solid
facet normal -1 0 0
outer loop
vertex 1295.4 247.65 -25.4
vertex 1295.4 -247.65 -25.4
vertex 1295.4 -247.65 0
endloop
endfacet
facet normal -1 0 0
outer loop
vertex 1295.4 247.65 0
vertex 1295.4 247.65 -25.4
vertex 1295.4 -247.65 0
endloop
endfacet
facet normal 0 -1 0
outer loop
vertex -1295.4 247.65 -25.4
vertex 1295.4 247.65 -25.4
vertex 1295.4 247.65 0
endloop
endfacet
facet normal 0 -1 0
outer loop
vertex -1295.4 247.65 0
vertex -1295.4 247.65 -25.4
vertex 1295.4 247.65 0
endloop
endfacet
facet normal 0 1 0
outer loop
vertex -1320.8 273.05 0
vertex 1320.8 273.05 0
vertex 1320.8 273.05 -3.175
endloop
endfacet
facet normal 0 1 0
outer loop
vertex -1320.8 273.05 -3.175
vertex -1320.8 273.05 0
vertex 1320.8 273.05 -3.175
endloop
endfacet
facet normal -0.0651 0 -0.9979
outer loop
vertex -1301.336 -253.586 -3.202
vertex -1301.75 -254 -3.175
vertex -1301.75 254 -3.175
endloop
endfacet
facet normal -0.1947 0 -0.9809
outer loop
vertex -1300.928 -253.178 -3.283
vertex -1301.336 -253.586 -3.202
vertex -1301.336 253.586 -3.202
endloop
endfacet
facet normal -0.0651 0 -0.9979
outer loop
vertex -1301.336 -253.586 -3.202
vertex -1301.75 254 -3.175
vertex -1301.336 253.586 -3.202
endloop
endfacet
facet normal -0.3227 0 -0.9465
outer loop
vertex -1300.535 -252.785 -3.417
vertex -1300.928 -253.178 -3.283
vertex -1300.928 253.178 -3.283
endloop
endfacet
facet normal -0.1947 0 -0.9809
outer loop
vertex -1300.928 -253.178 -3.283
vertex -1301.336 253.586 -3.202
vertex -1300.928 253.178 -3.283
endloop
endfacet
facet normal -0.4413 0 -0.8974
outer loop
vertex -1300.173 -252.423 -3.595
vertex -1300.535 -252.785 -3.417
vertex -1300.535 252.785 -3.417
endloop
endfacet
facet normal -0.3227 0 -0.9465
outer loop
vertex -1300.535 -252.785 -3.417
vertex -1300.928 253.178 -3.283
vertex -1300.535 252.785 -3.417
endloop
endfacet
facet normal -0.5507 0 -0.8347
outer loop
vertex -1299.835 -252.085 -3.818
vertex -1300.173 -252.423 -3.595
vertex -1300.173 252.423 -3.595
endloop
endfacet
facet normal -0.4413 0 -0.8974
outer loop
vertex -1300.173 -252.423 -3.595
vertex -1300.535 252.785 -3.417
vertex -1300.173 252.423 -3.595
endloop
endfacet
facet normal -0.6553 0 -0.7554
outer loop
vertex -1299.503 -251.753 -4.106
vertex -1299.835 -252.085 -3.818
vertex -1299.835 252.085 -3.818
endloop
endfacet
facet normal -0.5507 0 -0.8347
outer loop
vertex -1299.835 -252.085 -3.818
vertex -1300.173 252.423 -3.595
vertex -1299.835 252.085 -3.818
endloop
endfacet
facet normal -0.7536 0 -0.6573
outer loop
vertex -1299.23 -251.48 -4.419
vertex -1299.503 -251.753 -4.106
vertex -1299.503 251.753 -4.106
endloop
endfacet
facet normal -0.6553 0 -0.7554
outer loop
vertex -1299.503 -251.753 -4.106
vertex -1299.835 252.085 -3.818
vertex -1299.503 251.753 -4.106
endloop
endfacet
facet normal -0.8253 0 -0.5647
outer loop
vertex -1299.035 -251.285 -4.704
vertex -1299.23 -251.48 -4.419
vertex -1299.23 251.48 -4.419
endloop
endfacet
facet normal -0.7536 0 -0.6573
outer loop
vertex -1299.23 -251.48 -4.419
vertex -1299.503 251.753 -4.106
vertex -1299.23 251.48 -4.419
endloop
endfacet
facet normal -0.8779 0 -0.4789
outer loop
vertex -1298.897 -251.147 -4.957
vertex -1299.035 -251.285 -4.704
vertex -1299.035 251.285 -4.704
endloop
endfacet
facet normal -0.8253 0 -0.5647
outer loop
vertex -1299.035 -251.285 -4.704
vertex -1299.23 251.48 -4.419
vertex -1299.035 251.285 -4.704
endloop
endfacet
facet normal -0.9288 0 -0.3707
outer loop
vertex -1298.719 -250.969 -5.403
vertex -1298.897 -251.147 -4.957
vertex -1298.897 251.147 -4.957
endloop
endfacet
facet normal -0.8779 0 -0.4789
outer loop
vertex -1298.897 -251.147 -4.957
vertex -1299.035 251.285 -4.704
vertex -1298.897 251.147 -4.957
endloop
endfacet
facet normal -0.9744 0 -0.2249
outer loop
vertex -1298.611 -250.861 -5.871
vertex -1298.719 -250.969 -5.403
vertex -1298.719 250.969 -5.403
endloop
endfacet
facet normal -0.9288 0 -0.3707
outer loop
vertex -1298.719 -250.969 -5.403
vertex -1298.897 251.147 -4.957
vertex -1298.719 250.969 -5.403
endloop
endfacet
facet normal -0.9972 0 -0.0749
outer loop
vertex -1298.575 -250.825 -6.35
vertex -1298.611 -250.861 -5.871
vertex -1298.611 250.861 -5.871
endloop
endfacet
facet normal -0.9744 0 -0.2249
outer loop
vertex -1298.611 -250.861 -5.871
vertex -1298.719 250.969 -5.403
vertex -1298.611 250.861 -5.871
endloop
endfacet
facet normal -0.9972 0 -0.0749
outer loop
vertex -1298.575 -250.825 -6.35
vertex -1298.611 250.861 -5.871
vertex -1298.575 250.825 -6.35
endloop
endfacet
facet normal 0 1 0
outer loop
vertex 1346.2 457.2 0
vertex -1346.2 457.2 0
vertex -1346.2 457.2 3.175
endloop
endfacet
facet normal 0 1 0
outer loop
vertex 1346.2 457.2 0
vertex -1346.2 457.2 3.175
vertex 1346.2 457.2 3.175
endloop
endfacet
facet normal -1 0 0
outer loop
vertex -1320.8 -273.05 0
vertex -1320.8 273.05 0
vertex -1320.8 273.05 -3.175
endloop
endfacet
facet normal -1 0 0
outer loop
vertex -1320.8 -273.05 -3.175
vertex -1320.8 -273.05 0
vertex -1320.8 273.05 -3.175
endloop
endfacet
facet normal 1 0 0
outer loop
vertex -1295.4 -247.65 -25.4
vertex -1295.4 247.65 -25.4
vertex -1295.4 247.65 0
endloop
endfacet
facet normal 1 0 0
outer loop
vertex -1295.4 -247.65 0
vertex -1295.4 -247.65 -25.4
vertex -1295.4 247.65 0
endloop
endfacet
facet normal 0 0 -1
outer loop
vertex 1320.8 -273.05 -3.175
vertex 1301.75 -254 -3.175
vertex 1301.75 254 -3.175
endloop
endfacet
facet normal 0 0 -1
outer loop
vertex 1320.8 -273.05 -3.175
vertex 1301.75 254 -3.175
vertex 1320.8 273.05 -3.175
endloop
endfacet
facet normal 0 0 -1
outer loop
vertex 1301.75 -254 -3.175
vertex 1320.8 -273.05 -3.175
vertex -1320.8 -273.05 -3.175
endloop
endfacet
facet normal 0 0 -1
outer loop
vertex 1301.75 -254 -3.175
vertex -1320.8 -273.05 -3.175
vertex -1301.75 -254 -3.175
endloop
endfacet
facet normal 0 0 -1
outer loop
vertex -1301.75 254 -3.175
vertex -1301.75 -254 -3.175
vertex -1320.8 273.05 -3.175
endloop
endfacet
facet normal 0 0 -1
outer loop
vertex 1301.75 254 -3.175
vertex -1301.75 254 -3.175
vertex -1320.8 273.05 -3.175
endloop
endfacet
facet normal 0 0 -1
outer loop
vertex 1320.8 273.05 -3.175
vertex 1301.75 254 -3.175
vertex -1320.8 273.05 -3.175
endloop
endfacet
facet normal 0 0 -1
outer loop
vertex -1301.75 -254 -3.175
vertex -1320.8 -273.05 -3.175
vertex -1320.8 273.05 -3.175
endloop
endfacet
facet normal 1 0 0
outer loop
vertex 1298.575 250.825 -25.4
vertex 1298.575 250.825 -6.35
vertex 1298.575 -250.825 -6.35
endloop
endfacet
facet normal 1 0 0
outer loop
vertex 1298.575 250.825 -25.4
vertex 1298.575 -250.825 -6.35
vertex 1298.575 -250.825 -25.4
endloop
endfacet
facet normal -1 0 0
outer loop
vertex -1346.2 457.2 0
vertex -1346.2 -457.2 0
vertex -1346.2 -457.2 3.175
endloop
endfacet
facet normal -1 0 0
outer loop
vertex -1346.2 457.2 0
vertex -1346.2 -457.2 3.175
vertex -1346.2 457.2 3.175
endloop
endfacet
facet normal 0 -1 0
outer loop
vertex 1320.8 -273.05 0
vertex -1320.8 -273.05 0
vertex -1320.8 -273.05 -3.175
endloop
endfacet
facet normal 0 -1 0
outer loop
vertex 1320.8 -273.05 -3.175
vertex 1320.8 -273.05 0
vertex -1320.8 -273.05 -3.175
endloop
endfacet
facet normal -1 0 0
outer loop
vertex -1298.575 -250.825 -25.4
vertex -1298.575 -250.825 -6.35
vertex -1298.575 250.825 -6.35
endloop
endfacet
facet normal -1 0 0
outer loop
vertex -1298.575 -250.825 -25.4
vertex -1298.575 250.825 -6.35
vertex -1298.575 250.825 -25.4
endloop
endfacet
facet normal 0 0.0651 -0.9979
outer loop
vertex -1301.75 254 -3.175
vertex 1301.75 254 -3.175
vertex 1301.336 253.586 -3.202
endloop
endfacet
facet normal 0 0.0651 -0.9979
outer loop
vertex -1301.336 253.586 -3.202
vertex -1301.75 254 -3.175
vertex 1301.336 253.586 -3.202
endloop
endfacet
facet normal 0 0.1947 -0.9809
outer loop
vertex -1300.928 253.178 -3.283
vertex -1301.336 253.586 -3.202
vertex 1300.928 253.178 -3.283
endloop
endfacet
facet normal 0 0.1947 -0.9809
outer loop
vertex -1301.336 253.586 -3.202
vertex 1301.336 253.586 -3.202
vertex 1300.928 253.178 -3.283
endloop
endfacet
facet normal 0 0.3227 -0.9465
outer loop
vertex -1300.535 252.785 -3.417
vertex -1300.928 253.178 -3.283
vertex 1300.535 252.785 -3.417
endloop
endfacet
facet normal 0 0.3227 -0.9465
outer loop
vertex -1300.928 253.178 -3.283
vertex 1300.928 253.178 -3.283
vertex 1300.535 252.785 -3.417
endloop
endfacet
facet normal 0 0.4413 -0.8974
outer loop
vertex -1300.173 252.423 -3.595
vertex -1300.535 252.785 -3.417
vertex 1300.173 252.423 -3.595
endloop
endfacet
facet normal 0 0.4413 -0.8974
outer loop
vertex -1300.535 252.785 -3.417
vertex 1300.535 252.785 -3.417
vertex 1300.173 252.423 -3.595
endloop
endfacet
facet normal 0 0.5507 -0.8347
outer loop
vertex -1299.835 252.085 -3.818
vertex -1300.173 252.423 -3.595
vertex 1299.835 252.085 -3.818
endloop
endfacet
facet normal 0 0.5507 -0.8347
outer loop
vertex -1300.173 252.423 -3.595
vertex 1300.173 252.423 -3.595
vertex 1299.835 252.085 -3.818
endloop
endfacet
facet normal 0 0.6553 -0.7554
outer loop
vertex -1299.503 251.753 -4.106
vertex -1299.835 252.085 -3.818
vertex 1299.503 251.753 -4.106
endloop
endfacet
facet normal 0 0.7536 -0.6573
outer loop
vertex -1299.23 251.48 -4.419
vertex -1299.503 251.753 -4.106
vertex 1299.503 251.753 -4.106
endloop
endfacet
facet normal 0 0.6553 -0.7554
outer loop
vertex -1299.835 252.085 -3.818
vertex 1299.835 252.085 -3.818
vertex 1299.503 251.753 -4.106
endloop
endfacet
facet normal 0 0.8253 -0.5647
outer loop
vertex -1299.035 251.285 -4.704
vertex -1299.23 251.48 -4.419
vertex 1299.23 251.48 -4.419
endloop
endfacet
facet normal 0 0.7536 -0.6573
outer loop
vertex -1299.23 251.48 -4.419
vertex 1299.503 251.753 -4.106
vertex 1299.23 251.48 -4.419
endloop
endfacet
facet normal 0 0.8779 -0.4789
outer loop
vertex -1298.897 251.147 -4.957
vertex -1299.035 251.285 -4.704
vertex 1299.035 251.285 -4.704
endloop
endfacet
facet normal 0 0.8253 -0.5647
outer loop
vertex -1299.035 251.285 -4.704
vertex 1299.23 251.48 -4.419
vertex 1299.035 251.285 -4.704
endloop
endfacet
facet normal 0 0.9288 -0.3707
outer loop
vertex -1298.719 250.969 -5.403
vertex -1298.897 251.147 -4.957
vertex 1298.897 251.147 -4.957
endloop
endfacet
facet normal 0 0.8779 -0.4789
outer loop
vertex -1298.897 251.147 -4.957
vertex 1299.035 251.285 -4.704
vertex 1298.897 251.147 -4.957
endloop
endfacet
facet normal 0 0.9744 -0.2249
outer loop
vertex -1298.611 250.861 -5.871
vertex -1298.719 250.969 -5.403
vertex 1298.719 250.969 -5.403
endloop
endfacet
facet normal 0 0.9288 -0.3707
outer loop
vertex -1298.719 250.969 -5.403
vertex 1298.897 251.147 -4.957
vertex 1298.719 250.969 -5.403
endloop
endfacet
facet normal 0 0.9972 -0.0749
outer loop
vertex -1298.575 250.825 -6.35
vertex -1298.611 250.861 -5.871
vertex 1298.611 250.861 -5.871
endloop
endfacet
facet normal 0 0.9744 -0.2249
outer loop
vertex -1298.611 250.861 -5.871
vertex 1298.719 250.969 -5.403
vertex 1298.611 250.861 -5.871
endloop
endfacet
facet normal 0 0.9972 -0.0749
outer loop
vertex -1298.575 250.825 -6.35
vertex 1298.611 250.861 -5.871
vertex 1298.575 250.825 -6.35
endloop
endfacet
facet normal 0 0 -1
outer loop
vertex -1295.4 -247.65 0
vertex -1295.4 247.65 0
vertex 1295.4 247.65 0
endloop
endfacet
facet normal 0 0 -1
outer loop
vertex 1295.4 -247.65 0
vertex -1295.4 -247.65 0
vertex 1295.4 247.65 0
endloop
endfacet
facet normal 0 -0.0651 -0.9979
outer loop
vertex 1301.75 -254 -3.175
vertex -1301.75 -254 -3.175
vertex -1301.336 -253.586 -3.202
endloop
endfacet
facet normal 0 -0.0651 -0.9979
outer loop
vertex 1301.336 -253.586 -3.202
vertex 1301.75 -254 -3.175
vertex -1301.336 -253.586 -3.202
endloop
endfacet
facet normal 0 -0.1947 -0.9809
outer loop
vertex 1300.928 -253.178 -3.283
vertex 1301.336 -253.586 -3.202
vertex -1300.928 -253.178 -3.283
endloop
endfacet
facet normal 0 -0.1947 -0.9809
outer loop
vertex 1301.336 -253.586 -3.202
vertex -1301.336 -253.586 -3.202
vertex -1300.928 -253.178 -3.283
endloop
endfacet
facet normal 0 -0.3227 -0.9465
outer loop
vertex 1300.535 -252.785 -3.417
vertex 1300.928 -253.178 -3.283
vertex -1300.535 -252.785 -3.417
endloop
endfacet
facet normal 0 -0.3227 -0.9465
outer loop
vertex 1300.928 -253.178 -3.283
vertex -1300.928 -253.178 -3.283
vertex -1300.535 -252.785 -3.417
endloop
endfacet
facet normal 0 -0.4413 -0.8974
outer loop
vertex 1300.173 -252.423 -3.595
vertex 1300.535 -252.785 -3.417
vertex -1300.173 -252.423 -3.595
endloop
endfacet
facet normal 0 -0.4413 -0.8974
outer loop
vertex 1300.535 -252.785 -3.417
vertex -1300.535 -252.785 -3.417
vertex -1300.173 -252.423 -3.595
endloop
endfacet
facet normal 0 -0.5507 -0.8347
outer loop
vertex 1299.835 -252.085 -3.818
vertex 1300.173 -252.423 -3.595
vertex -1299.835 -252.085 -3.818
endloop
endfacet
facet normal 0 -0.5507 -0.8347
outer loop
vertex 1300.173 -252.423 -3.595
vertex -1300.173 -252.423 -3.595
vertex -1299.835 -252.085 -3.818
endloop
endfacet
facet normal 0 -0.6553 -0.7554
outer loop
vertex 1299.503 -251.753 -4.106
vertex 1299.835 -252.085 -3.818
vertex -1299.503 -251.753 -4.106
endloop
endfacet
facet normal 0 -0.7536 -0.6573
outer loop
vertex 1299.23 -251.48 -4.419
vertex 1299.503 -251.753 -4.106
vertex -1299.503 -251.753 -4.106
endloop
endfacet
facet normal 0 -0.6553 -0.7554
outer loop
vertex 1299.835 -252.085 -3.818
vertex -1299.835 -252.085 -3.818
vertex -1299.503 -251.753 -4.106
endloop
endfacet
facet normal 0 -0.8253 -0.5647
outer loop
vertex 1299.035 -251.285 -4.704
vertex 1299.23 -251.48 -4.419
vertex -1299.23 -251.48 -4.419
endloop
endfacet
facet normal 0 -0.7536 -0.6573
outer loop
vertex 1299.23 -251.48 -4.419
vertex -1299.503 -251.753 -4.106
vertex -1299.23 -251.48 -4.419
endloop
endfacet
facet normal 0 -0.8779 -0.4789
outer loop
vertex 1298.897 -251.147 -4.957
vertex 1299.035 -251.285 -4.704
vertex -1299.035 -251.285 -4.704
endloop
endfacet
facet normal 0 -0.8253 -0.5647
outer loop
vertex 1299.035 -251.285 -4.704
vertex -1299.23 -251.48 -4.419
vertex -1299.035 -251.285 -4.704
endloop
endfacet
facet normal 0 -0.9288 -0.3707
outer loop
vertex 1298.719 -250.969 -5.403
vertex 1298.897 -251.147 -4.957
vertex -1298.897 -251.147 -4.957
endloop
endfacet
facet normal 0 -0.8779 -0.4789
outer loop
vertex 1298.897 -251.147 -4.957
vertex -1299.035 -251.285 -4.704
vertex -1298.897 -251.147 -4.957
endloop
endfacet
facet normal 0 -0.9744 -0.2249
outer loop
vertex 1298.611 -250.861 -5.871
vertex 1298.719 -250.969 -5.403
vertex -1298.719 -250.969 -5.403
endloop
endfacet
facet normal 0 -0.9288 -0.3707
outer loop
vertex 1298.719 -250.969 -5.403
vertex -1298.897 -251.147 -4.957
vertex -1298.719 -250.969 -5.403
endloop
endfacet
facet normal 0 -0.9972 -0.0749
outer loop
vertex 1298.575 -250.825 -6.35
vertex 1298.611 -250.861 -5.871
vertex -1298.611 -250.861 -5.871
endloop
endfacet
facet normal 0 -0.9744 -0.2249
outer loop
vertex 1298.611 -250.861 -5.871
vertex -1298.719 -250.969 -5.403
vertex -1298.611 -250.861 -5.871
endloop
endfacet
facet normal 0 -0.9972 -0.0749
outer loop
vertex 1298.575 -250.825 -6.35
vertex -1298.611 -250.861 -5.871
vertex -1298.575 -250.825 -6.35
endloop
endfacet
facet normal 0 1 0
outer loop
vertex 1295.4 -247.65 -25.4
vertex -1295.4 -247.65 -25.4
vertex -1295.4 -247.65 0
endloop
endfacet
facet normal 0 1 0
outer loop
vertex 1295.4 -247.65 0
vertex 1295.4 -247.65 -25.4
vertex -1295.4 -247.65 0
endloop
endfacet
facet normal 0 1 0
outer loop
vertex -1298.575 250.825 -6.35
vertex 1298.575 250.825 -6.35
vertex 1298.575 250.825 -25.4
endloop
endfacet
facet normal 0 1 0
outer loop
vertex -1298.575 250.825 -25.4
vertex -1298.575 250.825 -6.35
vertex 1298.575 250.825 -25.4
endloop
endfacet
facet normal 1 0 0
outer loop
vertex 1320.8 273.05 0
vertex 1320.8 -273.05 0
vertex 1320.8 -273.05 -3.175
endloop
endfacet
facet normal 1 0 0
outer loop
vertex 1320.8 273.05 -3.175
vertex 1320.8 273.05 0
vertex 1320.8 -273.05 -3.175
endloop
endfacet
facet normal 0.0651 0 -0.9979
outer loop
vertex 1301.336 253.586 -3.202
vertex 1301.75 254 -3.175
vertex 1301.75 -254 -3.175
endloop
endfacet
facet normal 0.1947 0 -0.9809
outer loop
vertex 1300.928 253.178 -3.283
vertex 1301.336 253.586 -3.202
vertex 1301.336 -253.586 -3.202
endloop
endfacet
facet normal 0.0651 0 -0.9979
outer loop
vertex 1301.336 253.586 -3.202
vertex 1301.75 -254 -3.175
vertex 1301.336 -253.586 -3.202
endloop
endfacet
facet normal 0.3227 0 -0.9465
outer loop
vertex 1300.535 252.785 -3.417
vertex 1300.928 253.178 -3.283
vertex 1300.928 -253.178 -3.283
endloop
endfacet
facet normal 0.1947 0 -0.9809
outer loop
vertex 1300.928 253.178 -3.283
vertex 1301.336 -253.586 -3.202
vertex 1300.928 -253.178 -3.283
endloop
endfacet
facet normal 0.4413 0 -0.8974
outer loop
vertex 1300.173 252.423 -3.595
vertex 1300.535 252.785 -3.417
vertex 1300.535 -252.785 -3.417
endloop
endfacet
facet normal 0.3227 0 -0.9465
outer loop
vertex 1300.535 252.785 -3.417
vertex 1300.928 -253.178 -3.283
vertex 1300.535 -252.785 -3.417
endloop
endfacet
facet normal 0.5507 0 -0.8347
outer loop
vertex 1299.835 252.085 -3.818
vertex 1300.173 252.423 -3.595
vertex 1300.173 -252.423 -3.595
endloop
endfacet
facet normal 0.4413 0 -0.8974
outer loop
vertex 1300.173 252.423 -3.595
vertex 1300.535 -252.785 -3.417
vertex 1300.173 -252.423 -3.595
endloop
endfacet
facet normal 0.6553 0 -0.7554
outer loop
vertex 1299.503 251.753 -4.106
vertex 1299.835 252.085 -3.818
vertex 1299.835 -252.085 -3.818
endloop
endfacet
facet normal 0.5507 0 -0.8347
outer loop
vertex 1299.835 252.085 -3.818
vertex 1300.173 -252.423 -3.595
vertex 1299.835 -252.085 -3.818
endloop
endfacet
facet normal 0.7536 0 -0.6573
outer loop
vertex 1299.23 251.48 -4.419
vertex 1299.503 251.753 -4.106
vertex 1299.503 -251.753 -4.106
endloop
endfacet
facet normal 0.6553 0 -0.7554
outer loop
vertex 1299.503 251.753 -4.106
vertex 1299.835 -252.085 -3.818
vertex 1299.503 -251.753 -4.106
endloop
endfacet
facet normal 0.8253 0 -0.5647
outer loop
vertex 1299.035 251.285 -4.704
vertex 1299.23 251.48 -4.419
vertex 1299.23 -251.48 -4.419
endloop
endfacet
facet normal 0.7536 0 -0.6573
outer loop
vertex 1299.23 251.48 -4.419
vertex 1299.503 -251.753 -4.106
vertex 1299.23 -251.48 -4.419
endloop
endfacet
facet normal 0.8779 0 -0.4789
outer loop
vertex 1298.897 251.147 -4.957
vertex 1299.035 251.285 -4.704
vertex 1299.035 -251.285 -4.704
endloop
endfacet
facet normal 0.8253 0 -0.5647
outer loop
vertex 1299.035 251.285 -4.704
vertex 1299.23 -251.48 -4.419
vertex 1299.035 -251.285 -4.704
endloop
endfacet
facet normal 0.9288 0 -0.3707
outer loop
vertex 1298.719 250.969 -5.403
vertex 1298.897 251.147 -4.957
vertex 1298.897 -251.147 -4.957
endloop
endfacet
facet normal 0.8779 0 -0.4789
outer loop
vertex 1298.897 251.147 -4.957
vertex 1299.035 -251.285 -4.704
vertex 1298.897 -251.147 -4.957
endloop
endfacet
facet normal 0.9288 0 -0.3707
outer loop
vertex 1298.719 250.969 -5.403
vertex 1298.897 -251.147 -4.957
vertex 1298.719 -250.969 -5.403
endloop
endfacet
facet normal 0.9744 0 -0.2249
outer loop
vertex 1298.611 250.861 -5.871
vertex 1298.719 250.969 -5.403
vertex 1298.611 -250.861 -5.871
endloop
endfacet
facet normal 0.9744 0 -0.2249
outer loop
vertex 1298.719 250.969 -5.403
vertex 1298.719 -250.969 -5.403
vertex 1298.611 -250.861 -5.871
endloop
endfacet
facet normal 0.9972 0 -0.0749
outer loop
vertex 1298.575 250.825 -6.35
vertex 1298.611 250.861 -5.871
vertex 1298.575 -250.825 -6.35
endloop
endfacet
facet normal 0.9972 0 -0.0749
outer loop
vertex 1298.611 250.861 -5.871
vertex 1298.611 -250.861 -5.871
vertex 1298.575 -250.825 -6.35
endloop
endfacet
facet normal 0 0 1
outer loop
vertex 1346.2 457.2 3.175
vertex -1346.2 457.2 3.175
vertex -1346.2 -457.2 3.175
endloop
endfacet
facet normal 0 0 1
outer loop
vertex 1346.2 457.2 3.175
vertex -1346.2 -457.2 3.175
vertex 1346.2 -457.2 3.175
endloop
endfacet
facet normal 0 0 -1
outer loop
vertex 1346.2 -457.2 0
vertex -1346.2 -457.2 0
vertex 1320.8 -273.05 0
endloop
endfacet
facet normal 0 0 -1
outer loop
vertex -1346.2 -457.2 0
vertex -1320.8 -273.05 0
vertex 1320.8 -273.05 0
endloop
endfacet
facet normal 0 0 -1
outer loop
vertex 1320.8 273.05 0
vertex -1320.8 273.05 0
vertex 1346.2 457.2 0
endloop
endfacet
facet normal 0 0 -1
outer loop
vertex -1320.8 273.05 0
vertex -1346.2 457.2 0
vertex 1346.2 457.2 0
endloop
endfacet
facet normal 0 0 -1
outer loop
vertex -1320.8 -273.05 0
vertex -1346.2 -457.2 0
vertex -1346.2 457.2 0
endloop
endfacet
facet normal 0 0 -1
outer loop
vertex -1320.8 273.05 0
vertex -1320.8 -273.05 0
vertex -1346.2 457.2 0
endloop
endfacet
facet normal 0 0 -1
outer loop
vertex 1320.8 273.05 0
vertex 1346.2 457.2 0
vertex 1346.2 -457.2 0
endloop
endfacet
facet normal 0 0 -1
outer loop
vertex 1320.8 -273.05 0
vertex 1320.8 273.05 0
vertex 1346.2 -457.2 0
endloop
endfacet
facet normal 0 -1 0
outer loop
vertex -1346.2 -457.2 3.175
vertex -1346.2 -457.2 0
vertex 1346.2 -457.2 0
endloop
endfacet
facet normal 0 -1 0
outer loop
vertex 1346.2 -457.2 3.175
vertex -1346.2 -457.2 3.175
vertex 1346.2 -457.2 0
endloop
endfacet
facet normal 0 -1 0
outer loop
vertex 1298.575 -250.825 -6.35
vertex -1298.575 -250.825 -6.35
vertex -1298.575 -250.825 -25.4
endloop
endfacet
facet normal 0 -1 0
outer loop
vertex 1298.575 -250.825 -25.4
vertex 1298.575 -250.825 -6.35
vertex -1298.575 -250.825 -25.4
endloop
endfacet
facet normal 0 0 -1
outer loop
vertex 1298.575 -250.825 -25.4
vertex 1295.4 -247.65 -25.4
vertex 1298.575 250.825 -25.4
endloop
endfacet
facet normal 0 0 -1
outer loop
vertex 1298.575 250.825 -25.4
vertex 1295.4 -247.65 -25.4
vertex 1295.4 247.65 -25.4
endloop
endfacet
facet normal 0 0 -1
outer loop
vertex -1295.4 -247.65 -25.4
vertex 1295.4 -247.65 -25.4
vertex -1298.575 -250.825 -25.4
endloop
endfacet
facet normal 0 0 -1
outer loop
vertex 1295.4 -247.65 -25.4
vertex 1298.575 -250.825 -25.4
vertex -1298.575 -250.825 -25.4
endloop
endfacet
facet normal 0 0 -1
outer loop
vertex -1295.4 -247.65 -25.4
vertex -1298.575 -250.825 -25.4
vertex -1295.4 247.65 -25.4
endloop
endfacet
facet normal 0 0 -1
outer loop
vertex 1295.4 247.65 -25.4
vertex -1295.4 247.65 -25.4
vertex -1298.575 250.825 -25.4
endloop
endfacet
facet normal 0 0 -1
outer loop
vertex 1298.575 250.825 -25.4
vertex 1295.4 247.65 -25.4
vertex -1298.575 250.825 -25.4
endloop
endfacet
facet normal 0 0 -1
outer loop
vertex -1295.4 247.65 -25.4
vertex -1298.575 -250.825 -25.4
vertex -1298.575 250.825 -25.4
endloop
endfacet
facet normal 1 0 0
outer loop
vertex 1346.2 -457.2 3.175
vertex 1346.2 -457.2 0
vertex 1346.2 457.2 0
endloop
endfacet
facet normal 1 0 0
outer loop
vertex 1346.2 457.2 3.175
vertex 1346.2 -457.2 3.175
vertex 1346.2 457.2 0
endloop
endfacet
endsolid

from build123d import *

# Parameters (mm, degrees)
F0_W     = 2692.4
F0_H     = 914.4
F1_DEPTH = 3.175


with BuildPart() as f1:
    # F0 (on Top) → F1 (new body)
    with BuildSketch(Plane.XY):
        Rectangle(F0_W, F0_H)
    extrude(amount=F1_DEPTH)

    # F4: sweep along a path in F2
    with BuildLine(Plane(origin=(0, 0, 0), x_dir=(1, 0, 0), z_dir=(0, 0, -1))) as f4_path:
        Line((-1295.4, 247.65), (-1295.4, -247.65))
        Line((-1295.4, -247.65), (1295.4, -247.65))
        Line((1295.4, -247.65), (1295.4, 247.65))
        Line((1295.4, 247.65), (-1295.4, 247.65))
    # F3 (on Front) → F4 (sweep)
    with BuildSketch(Plane.XZ):
        with BuildLine():
            Line((-1295.4, -25.4), (-1295.4, 0))
            Line((-1295.4, 0), (-1320.8, 0))
            Line((-1320.8, 0), (-1320.8, -3.175))
            Line((-1320.8, -3.175), (-1301.75, -3.175))
            ThreePointArc((-1301.75, -3.175), (-1299.5049359697, -4.1049359697), (-1298.575, -6.35))
            Line((-1298.575, -6.35), (-1298.575, -25.4))
            Line((-1298.575, -25.4), (-1295.4, -25.4))
        make_face()
    sweep(path=f4_path.line, transition=Transition.RIGHT)


solid = f1.part
